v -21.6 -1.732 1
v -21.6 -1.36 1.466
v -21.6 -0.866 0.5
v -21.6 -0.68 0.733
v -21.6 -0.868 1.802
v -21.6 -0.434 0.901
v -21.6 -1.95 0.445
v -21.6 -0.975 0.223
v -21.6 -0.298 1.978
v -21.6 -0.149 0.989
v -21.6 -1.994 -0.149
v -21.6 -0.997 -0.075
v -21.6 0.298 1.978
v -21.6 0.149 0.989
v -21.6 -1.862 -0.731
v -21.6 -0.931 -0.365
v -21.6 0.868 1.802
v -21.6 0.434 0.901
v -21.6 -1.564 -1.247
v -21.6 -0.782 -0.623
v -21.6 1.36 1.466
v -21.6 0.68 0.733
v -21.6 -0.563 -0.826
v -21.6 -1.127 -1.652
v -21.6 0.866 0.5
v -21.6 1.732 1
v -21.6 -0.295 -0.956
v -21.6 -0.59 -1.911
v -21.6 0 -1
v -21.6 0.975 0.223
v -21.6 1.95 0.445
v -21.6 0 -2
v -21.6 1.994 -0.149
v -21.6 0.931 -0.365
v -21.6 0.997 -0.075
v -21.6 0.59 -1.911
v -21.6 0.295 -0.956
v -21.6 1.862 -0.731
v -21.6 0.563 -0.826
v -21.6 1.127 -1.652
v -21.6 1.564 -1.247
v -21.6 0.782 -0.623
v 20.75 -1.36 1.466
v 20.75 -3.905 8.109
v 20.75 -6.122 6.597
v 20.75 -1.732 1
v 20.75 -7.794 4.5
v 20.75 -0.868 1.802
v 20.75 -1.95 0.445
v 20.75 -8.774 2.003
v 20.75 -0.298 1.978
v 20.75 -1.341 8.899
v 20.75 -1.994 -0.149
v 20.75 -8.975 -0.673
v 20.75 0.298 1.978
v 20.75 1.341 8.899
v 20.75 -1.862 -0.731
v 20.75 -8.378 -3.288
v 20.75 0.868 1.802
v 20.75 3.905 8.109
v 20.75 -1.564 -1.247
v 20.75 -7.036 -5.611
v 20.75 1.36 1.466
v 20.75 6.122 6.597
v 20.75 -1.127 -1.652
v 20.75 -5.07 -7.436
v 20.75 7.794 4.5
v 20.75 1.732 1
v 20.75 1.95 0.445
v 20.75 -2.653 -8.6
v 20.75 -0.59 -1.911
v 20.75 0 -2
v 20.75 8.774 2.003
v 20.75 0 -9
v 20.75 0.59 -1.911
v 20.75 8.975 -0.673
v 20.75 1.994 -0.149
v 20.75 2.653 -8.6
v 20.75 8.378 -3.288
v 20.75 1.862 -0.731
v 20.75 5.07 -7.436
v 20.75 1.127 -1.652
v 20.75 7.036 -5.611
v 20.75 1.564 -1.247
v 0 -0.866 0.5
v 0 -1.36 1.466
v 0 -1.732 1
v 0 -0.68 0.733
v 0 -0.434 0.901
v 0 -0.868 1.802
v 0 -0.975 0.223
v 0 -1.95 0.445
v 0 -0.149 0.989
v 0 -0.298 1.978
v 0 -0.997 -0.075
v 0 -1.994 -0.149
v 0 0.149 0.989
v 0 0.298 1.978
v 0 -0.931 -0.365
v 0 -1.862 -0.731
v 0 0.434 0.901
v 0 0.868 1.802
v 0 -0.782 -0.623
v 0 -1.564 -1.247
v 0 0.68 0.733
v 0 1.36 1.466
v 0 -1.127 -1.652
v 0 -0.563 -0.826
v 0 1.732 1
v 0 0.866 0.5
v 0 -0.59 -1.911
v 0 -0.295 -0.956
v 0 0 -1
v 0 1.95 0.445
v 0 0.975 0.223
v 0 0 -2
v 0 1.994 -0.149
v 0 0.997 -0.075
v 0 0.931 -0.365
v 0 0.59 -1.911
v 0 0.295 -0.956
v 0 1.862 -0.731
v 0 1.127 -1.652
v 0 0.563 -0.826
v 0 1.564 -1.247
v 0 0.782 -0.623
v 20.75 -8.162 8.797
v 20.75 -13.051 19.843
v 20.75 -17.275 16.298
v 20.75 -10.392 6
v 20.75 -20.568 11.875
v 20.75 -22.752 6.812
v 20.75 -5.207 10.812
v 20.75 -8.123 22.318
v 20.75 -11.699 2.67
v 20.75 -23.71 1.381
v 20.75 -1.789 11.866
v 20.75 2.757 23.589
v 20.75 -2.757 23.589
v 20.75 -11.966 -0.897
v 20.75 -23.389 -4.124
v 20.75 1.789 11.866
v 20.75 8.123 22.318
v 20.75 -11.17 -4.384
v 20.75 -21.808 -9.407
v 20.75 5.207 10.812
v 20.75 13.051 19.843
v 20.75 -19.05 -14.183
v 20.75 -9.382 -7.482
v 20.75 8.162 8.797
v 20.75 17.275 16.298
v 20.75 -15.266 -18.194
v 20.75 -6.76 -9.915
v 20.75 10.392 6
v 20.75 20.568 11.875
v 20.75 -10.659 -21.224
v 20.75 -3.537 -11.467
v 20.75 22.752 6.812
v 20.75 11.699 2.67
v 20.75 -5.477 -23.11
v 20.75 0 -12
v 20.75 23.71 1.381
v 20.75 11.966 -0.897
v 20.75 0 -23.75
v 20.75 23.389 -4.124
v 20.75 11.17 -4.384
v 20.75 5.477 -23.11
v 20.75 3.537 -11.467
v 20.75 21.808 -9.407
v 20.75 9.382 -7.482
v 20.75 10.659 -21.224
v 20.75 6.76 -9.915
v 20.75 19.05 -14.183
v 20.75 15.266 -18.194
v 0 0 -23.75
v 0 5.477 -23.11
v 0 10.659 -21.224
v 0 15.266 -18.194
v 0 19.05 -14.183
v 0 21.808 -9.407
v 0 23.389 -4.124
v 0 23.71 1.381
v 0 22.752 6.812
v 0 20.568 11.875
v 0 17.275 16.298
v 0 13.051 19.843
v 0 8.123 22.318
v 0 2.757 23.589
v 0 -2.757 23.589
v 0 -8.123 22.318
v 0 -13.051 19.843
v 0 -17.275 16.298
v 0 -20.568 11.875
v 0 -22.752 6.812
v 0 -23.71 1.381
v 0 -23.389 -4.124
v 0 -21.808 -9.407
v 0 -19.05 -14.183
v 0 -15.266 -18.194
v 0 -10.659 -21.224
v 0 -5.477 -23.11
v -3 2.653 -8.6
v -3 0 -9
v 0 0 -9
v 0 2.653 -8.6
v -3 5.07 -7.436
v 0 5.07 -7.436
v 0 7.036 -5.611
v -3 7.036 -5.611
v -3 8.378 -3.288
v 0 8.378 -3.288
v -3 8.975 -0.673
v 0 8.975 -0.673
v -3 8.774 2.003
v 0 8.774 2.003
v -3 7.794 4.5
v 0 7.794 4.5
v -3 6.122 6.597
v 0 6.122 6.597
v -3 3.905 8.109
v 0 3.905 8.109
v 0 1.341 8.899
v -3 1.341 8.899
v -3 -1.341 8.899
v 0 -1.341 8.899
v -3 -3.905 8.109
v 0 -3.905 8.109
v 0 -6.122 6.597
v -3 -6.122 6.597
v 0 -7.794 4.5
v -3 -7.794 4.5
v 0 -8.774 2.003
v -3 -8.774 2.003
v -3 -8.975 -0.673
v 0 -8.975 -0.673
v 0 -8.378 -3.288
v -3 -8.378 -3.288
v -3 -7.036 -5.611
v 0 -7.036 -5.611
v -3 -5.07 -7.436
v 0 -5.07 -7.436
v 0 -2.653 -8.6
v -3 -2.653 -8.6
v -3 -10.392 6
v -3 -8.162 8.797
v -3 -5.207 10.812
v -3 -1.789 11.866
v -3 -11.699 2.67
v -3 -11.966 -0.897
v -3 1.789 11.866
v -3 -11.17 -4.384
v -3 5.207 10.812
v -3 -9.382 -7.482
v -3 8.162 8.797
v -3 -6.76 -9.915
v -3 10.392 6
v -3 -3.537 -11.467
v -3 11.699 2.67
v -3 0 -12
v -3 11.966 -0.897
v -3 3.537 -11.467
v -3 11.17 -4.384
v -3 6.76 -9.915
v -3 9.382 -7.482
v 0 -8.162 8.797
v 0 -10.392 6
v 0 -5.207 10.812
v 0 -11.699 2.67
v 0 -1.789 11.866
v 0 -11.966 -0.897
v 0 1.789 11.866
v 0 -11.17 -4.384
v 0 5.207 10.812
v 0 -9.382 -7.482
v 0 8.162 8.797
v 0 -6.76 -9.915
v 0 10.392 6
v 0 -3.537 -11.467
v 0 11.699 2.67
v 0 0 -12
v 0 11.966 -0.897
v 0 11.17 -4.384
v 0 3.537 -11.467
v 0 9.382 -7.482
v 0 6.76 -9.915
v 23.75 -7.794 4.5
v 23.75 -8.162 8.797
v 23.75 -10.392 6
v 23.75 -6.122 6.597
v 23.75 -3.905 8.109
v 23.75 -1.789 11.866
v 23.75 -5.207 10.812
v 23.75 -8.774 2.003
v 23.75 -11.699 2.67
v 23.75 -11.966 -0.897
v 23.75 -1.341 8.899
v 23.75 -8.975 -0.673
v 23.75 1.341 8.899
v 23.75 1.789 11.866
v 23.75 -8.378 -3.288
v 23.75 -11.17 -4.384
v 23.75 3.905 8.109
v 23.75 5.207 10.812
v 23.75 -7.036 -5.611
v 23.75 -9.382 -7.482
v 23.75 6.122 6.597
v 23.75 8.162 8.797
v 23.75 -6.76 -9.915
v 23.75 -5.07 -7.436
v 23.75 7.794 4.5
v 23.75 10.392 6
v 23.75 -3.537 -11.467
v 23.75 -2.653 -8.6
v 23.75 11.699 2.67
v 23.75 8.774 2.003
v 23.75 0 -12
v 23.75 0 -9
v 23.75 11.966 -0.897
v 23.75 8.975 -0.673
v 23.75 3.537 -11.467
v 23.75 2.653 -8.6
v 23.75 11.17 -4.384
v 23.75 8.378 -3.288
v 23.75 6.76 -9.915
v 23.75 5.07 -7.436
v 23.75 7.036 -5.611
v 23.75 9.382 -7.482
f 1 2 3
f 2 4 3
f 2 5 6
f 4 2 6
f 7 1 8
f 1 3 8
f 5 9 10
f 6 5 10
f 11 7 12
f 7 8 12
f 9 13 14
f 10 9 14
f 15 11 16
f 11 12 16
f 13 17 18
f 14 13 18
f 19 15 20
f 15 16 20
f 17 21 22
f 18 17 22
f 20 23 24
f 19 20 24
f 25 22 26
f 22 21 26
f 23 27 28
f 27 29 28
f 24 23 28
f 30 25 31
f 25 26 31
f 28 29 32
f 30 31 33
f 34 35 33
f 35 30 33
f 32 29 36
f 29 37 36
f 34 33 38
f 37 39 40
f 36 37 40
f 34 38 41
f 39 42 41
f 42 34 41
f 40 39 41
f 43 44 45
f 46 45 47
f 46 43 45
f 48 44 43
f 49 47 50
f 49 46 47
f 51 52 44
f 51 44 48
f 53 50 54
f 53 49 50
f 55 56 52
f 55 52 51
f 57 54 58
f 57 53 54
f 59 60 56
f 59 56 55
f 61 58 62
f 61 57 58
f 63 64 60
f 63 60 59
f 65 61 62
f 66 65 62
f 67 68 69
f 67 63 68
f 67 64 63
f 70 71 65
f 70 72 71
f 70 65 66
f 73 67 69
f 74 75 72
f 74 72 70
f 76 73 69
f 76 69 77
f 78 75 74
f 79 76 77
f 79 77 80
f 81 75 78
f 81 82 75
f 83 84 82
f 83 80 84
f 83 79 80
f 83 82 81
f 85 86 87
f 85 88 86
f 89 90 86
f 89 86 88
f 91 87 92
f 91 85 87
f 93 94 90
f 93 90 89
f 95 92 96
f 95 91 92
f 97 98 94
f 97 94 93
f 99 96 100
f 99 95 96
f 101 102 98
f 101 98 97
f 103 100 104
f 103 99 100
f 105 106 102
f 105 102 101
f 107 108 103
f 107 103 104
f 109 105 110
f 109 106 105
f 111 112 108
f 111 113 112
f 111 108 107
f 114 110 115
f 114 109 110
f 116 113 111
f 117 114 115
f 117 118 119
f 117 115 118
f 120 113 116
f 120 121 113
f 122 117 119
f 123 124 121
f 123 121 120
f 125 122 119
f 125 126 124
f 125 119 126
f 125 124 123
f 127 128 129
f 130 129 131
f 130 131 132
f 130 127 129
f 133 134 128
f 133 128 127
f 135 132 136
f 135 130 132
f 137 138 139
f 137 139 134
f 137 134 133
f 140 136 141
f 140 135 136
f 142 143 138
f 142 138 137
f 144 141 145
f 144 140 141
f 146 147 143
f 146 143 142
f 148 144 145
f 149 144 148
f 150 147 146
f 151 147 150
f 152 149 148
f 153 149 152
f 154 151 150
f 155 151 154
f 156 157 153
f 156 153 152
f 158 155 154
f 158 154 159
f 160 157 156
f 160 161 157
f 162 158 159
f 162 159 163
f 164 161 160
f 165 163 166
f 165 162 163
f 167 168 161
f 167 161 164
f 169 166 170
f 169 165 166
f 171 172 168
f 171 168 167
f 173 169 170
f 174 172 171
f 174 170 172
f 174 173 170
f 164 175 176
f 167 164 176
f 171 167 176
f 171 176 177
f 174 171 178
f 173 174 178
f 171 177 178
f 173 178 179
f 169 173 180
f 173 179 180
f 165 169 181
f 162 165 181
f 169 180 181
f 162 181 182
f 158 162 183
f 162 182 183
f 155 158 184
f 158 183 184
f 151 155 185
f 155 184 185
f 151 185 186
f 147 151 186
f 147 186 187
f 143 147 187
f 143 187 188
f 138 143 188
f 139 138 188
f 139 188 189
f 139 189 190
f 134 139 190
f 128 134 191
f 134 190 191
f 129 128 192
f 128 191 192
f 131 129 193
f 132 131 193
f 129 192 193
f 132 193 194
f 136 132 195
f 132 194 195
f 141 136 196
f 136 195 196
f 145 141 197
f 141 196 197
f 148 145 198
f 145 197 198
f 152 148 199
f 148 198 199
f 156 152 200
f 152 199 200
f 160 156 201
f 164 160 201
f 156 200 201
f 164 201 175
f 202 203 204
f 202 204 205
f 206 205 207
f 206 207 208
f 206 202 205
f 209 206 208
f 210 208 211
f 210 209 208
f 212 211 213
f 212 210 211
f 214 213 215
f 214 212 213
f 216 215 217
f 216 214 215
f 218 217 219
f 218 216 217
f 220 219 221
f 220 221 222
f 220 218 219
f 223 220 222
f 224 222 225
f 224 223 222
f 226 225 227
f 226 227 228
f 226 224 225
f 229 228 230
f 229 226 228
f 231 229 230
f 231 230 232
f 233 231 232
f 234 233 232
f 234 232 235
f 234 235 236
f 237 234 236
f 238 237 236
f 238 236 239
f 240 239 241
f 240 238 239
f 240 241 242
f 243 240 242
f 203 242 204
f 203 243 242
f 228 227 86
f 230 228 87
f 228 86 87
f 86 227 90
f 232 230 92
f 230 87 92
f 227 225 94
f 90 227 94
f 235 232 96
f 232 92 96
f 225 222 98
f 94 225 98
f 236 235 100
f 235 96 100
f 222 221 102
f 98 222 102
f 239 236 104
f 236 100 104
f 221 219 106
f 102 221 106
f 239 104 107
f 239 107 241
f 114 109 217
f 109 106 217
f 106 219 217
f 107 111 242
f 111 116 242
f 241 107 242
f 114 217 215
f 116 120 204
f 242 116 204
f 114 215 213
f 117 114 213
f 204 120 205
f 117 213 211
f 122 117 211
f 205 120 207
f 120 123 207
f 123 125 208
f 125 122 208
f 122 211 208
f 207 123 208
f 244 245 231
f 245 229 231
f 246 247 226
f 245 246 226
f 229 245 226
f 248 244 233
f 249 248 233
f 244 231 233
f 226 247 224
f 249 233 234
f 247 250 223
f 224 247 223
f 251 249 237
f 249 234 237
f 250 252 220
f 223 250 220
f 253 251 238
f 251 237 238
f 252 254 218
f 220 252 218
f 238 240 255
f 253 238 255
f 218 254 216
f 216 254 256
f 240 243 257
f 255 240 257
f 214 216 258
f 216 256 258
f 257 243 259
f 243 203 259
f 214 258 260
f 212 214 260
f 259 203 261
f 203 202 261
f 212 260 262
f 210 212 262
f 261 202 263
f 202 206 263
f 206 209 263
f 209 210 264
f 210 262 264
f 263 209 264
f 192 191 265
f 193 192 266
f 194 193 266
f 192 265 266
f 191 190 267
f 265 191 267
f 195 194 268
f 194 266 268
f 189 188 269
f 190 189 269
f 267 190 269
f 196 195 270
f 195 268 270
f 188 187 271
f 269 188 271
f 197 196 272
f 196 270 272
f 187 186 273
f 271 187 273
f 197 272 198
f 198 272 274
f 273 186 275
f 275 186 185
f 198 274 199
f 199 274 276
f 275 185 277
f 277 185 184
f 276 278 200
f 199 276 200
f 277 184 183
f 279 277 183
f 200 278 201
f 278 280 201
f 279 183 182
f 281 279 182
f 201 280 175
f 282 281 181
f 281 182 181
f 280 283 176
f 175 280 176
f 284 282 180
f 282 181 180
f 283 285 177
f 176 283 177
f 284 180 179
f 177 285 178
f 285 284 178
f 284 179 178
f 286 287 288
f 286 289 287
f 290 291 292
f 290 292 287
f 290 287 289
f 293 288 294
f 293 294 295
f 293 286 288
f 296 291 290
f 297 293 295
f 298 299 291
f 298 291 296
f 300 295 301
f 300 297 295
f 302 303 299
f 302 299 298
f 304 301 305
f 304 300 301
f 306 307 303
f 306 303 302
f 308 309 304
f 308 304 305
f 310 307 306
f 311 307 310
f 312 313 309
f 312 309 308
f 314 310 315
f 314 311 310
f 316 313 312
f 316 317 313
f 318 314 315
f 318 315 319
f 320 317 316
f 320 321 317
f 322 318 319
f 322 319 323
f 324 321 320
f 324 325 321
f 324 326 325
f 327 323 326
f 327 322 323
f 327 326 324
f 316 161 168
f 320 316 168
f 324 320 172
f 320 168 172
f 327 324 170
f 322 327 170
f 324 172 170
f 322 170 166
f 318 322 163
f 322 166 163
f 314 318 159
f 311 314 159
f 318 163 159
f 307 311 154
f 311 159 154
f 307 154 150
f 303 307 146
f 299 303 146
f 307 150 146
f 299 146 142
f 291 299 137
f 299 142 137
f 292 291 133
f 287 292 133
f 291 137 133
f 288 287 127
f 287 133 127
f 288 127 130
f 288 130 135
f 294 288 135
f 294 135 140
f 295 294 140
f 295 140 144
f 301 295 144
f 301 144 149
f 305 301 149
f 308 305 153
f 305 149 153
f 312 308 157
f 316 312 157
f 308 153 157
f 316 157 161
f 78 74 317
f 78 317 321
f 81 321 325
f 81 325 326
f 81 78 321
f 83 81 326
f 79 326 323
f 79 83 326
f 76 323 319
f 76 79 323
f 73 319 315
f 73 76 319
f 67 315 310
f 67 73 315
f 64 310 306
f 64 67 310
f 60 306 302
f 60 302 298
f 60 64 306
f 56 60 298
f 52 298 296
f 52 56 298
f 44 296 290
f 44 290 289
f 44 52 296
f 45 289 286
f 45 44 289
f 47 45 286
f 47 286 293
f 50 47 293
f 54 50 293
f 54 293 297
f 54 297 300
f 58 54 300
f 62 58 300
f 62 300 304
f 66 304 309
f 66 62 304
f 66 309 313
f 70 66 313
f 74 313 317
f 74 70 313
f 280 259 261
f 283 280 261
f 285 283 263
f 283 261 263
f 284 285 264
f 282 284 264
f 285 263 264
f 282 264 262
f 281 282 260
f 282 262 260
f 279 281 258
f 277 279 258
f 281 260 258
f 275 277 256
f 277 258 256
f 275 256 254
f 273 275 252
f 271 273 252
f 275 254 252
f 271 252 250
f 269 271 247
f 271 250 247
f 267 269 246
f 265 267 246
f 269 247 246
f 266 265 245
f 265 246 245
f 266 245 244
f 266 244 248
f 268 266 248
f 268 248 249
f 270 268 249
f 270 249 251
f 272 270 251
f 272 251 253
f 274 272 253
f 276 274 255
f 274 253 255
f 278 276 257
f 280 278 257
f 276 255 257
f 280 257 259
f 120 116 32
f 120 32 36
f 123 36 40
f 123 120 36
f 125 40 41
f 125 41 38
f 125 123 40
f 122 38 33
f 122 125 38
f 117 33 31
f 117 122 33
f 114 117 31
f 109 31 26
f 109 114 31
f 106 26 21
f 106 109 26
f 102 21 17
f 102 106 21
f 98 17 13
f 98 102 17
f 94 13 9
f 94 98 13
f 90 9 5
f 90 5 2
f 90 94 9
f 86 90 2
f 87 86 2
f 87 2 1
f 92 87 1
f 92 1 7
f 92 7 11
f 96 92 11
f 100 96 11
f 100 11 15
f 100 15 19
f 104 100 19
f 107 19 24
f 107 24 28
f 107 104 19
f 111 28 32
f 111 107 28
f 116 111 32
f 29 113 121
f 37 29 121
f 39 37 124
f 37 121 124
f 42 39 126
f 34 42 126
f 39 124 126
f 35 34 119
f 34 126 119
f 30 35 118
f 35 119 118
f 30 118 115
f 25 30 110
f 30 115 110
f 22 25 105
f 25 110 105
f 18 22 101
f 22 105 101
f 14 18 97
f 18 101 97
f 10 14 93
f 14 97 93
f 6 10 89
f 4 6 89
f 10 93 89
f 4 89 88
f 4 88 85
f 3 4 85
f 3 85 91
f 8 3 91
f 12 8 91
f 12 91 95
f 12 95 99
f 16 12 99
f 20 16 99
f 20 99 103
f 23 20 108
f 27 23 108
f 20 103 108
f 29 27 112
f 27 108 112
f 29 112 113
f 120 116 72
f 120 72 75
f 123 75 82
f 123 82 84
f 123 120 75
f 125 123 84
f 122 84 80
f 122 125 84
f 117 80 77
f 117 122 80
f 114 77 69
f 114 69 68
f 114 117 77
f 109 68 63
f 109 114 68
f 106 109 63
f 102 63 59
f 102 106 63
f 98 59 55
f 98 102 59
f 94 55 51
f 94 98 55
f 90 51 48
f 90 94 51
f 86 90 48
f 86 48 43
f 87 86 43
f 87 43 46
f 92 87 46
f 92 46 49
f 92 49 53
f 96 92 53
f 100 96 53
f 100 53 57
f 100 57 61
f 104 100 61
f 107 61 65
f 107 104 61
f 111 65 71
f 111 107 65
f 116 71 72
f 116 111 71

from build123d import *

# Parameters (mm, degrees)
SKETCH1_R           = 23.75
SKETCH1_R_2         = 3
BOSS_EXTRUDE1_DEPTH = 20.75
BOSS_EXTRUDE2_START = -20.75
SKETCH4_R           = 3
SKETCH4_R_2         = 2
BOSS_EXTRUDE2_DEPTH = 20.75
SKETCH5_R           = 12
SKETCH5_R_2         = 9
BOSS_EXTRUDE3_DEPTH = 3
BOSS_EXTRUDE4_START = -3
SKETCH6_R           = 12
SKETCH6_R_2         = 9
BOSS_EXTRUDE4_DEPTH = 3
SKETCH7_R           = 2
SKETCH7_R_2         = 1
BOSS_EXTRUDE6_DEPTH = 21.6


with BuildPart() as part:
    # Sketch1 → Boss-Extrude1 (new body)
    with BuildSketch(Plane(origin=(0, 0, 0), x_dir=(0, 0, -1), z_dir=(1, 0, 0))):
        Circle(SKETCH1_R)
        Circle(SKETCH1_R_2, mode=Mode.SUBTRACT)
    extrude(amount=BOSS_EXTRUDE1_DEPTH)

    # Sketch4 → Boss-Extrude2 (add)
    with BuildSketch(Plane(origin=(20.75, 0, 0), x_dir=(0, 0, -1), z_dir=(1, 0, 0)).offset(BOSS_EXTRUDE2_START)):
        Circle(SKETCH4_R)
        Circle(SKETCH4_R_2, mode=Mode.SUBTRACT)
    extrude(amount=BOSS_EXTRUDE2_DEPTH)

    # Sketch5 → Boss-Extrude3 (add)
    with BuildSketch(Plane(origin=(20.75, 0, 0), x_dir=(0, 0, -1), z_dir=(1, 0, 0))):
        Circle(SKETCH5_R)
        Circle(SKETCH5_R_2, mode=Mode.SUBTRACT)
    extrude(amount=BOSS_EXTRUDE3_DEPTH)

    # Sketch6 → Boss-Extrude4 (add)
    with BuildSketch(Plane(origin=(0, 0, 0), x_dir=(0, 0, -1), z_dir=(1, 0, 0)).offset(BOSS_EXTRUDE4_START)):
        Circle(SKETCH6_R)
        Circle(SKETCH6_R_2, mode=Mode.SUBTRACT)
    extrude(amount=BOSS_EXTRUDE4_DEPTH)


with BuildPart() as body_2:
    # Sketch7 → Boss-Extrude6 (new body)
    with BuildSketch(Plane(origin=(0, 0, 0), x_dir=(0, 0, -1), z_dir=(1, 0, 0))):
        Circle(SKETCH7_R)
        Circle(SKETCH7_R_2, mode=Mode.SUBTRACT)
    extrude(amount=-BOSS_EXTRUDE6_DEPTH)


solid = Compound([part.part, body_2.part])
